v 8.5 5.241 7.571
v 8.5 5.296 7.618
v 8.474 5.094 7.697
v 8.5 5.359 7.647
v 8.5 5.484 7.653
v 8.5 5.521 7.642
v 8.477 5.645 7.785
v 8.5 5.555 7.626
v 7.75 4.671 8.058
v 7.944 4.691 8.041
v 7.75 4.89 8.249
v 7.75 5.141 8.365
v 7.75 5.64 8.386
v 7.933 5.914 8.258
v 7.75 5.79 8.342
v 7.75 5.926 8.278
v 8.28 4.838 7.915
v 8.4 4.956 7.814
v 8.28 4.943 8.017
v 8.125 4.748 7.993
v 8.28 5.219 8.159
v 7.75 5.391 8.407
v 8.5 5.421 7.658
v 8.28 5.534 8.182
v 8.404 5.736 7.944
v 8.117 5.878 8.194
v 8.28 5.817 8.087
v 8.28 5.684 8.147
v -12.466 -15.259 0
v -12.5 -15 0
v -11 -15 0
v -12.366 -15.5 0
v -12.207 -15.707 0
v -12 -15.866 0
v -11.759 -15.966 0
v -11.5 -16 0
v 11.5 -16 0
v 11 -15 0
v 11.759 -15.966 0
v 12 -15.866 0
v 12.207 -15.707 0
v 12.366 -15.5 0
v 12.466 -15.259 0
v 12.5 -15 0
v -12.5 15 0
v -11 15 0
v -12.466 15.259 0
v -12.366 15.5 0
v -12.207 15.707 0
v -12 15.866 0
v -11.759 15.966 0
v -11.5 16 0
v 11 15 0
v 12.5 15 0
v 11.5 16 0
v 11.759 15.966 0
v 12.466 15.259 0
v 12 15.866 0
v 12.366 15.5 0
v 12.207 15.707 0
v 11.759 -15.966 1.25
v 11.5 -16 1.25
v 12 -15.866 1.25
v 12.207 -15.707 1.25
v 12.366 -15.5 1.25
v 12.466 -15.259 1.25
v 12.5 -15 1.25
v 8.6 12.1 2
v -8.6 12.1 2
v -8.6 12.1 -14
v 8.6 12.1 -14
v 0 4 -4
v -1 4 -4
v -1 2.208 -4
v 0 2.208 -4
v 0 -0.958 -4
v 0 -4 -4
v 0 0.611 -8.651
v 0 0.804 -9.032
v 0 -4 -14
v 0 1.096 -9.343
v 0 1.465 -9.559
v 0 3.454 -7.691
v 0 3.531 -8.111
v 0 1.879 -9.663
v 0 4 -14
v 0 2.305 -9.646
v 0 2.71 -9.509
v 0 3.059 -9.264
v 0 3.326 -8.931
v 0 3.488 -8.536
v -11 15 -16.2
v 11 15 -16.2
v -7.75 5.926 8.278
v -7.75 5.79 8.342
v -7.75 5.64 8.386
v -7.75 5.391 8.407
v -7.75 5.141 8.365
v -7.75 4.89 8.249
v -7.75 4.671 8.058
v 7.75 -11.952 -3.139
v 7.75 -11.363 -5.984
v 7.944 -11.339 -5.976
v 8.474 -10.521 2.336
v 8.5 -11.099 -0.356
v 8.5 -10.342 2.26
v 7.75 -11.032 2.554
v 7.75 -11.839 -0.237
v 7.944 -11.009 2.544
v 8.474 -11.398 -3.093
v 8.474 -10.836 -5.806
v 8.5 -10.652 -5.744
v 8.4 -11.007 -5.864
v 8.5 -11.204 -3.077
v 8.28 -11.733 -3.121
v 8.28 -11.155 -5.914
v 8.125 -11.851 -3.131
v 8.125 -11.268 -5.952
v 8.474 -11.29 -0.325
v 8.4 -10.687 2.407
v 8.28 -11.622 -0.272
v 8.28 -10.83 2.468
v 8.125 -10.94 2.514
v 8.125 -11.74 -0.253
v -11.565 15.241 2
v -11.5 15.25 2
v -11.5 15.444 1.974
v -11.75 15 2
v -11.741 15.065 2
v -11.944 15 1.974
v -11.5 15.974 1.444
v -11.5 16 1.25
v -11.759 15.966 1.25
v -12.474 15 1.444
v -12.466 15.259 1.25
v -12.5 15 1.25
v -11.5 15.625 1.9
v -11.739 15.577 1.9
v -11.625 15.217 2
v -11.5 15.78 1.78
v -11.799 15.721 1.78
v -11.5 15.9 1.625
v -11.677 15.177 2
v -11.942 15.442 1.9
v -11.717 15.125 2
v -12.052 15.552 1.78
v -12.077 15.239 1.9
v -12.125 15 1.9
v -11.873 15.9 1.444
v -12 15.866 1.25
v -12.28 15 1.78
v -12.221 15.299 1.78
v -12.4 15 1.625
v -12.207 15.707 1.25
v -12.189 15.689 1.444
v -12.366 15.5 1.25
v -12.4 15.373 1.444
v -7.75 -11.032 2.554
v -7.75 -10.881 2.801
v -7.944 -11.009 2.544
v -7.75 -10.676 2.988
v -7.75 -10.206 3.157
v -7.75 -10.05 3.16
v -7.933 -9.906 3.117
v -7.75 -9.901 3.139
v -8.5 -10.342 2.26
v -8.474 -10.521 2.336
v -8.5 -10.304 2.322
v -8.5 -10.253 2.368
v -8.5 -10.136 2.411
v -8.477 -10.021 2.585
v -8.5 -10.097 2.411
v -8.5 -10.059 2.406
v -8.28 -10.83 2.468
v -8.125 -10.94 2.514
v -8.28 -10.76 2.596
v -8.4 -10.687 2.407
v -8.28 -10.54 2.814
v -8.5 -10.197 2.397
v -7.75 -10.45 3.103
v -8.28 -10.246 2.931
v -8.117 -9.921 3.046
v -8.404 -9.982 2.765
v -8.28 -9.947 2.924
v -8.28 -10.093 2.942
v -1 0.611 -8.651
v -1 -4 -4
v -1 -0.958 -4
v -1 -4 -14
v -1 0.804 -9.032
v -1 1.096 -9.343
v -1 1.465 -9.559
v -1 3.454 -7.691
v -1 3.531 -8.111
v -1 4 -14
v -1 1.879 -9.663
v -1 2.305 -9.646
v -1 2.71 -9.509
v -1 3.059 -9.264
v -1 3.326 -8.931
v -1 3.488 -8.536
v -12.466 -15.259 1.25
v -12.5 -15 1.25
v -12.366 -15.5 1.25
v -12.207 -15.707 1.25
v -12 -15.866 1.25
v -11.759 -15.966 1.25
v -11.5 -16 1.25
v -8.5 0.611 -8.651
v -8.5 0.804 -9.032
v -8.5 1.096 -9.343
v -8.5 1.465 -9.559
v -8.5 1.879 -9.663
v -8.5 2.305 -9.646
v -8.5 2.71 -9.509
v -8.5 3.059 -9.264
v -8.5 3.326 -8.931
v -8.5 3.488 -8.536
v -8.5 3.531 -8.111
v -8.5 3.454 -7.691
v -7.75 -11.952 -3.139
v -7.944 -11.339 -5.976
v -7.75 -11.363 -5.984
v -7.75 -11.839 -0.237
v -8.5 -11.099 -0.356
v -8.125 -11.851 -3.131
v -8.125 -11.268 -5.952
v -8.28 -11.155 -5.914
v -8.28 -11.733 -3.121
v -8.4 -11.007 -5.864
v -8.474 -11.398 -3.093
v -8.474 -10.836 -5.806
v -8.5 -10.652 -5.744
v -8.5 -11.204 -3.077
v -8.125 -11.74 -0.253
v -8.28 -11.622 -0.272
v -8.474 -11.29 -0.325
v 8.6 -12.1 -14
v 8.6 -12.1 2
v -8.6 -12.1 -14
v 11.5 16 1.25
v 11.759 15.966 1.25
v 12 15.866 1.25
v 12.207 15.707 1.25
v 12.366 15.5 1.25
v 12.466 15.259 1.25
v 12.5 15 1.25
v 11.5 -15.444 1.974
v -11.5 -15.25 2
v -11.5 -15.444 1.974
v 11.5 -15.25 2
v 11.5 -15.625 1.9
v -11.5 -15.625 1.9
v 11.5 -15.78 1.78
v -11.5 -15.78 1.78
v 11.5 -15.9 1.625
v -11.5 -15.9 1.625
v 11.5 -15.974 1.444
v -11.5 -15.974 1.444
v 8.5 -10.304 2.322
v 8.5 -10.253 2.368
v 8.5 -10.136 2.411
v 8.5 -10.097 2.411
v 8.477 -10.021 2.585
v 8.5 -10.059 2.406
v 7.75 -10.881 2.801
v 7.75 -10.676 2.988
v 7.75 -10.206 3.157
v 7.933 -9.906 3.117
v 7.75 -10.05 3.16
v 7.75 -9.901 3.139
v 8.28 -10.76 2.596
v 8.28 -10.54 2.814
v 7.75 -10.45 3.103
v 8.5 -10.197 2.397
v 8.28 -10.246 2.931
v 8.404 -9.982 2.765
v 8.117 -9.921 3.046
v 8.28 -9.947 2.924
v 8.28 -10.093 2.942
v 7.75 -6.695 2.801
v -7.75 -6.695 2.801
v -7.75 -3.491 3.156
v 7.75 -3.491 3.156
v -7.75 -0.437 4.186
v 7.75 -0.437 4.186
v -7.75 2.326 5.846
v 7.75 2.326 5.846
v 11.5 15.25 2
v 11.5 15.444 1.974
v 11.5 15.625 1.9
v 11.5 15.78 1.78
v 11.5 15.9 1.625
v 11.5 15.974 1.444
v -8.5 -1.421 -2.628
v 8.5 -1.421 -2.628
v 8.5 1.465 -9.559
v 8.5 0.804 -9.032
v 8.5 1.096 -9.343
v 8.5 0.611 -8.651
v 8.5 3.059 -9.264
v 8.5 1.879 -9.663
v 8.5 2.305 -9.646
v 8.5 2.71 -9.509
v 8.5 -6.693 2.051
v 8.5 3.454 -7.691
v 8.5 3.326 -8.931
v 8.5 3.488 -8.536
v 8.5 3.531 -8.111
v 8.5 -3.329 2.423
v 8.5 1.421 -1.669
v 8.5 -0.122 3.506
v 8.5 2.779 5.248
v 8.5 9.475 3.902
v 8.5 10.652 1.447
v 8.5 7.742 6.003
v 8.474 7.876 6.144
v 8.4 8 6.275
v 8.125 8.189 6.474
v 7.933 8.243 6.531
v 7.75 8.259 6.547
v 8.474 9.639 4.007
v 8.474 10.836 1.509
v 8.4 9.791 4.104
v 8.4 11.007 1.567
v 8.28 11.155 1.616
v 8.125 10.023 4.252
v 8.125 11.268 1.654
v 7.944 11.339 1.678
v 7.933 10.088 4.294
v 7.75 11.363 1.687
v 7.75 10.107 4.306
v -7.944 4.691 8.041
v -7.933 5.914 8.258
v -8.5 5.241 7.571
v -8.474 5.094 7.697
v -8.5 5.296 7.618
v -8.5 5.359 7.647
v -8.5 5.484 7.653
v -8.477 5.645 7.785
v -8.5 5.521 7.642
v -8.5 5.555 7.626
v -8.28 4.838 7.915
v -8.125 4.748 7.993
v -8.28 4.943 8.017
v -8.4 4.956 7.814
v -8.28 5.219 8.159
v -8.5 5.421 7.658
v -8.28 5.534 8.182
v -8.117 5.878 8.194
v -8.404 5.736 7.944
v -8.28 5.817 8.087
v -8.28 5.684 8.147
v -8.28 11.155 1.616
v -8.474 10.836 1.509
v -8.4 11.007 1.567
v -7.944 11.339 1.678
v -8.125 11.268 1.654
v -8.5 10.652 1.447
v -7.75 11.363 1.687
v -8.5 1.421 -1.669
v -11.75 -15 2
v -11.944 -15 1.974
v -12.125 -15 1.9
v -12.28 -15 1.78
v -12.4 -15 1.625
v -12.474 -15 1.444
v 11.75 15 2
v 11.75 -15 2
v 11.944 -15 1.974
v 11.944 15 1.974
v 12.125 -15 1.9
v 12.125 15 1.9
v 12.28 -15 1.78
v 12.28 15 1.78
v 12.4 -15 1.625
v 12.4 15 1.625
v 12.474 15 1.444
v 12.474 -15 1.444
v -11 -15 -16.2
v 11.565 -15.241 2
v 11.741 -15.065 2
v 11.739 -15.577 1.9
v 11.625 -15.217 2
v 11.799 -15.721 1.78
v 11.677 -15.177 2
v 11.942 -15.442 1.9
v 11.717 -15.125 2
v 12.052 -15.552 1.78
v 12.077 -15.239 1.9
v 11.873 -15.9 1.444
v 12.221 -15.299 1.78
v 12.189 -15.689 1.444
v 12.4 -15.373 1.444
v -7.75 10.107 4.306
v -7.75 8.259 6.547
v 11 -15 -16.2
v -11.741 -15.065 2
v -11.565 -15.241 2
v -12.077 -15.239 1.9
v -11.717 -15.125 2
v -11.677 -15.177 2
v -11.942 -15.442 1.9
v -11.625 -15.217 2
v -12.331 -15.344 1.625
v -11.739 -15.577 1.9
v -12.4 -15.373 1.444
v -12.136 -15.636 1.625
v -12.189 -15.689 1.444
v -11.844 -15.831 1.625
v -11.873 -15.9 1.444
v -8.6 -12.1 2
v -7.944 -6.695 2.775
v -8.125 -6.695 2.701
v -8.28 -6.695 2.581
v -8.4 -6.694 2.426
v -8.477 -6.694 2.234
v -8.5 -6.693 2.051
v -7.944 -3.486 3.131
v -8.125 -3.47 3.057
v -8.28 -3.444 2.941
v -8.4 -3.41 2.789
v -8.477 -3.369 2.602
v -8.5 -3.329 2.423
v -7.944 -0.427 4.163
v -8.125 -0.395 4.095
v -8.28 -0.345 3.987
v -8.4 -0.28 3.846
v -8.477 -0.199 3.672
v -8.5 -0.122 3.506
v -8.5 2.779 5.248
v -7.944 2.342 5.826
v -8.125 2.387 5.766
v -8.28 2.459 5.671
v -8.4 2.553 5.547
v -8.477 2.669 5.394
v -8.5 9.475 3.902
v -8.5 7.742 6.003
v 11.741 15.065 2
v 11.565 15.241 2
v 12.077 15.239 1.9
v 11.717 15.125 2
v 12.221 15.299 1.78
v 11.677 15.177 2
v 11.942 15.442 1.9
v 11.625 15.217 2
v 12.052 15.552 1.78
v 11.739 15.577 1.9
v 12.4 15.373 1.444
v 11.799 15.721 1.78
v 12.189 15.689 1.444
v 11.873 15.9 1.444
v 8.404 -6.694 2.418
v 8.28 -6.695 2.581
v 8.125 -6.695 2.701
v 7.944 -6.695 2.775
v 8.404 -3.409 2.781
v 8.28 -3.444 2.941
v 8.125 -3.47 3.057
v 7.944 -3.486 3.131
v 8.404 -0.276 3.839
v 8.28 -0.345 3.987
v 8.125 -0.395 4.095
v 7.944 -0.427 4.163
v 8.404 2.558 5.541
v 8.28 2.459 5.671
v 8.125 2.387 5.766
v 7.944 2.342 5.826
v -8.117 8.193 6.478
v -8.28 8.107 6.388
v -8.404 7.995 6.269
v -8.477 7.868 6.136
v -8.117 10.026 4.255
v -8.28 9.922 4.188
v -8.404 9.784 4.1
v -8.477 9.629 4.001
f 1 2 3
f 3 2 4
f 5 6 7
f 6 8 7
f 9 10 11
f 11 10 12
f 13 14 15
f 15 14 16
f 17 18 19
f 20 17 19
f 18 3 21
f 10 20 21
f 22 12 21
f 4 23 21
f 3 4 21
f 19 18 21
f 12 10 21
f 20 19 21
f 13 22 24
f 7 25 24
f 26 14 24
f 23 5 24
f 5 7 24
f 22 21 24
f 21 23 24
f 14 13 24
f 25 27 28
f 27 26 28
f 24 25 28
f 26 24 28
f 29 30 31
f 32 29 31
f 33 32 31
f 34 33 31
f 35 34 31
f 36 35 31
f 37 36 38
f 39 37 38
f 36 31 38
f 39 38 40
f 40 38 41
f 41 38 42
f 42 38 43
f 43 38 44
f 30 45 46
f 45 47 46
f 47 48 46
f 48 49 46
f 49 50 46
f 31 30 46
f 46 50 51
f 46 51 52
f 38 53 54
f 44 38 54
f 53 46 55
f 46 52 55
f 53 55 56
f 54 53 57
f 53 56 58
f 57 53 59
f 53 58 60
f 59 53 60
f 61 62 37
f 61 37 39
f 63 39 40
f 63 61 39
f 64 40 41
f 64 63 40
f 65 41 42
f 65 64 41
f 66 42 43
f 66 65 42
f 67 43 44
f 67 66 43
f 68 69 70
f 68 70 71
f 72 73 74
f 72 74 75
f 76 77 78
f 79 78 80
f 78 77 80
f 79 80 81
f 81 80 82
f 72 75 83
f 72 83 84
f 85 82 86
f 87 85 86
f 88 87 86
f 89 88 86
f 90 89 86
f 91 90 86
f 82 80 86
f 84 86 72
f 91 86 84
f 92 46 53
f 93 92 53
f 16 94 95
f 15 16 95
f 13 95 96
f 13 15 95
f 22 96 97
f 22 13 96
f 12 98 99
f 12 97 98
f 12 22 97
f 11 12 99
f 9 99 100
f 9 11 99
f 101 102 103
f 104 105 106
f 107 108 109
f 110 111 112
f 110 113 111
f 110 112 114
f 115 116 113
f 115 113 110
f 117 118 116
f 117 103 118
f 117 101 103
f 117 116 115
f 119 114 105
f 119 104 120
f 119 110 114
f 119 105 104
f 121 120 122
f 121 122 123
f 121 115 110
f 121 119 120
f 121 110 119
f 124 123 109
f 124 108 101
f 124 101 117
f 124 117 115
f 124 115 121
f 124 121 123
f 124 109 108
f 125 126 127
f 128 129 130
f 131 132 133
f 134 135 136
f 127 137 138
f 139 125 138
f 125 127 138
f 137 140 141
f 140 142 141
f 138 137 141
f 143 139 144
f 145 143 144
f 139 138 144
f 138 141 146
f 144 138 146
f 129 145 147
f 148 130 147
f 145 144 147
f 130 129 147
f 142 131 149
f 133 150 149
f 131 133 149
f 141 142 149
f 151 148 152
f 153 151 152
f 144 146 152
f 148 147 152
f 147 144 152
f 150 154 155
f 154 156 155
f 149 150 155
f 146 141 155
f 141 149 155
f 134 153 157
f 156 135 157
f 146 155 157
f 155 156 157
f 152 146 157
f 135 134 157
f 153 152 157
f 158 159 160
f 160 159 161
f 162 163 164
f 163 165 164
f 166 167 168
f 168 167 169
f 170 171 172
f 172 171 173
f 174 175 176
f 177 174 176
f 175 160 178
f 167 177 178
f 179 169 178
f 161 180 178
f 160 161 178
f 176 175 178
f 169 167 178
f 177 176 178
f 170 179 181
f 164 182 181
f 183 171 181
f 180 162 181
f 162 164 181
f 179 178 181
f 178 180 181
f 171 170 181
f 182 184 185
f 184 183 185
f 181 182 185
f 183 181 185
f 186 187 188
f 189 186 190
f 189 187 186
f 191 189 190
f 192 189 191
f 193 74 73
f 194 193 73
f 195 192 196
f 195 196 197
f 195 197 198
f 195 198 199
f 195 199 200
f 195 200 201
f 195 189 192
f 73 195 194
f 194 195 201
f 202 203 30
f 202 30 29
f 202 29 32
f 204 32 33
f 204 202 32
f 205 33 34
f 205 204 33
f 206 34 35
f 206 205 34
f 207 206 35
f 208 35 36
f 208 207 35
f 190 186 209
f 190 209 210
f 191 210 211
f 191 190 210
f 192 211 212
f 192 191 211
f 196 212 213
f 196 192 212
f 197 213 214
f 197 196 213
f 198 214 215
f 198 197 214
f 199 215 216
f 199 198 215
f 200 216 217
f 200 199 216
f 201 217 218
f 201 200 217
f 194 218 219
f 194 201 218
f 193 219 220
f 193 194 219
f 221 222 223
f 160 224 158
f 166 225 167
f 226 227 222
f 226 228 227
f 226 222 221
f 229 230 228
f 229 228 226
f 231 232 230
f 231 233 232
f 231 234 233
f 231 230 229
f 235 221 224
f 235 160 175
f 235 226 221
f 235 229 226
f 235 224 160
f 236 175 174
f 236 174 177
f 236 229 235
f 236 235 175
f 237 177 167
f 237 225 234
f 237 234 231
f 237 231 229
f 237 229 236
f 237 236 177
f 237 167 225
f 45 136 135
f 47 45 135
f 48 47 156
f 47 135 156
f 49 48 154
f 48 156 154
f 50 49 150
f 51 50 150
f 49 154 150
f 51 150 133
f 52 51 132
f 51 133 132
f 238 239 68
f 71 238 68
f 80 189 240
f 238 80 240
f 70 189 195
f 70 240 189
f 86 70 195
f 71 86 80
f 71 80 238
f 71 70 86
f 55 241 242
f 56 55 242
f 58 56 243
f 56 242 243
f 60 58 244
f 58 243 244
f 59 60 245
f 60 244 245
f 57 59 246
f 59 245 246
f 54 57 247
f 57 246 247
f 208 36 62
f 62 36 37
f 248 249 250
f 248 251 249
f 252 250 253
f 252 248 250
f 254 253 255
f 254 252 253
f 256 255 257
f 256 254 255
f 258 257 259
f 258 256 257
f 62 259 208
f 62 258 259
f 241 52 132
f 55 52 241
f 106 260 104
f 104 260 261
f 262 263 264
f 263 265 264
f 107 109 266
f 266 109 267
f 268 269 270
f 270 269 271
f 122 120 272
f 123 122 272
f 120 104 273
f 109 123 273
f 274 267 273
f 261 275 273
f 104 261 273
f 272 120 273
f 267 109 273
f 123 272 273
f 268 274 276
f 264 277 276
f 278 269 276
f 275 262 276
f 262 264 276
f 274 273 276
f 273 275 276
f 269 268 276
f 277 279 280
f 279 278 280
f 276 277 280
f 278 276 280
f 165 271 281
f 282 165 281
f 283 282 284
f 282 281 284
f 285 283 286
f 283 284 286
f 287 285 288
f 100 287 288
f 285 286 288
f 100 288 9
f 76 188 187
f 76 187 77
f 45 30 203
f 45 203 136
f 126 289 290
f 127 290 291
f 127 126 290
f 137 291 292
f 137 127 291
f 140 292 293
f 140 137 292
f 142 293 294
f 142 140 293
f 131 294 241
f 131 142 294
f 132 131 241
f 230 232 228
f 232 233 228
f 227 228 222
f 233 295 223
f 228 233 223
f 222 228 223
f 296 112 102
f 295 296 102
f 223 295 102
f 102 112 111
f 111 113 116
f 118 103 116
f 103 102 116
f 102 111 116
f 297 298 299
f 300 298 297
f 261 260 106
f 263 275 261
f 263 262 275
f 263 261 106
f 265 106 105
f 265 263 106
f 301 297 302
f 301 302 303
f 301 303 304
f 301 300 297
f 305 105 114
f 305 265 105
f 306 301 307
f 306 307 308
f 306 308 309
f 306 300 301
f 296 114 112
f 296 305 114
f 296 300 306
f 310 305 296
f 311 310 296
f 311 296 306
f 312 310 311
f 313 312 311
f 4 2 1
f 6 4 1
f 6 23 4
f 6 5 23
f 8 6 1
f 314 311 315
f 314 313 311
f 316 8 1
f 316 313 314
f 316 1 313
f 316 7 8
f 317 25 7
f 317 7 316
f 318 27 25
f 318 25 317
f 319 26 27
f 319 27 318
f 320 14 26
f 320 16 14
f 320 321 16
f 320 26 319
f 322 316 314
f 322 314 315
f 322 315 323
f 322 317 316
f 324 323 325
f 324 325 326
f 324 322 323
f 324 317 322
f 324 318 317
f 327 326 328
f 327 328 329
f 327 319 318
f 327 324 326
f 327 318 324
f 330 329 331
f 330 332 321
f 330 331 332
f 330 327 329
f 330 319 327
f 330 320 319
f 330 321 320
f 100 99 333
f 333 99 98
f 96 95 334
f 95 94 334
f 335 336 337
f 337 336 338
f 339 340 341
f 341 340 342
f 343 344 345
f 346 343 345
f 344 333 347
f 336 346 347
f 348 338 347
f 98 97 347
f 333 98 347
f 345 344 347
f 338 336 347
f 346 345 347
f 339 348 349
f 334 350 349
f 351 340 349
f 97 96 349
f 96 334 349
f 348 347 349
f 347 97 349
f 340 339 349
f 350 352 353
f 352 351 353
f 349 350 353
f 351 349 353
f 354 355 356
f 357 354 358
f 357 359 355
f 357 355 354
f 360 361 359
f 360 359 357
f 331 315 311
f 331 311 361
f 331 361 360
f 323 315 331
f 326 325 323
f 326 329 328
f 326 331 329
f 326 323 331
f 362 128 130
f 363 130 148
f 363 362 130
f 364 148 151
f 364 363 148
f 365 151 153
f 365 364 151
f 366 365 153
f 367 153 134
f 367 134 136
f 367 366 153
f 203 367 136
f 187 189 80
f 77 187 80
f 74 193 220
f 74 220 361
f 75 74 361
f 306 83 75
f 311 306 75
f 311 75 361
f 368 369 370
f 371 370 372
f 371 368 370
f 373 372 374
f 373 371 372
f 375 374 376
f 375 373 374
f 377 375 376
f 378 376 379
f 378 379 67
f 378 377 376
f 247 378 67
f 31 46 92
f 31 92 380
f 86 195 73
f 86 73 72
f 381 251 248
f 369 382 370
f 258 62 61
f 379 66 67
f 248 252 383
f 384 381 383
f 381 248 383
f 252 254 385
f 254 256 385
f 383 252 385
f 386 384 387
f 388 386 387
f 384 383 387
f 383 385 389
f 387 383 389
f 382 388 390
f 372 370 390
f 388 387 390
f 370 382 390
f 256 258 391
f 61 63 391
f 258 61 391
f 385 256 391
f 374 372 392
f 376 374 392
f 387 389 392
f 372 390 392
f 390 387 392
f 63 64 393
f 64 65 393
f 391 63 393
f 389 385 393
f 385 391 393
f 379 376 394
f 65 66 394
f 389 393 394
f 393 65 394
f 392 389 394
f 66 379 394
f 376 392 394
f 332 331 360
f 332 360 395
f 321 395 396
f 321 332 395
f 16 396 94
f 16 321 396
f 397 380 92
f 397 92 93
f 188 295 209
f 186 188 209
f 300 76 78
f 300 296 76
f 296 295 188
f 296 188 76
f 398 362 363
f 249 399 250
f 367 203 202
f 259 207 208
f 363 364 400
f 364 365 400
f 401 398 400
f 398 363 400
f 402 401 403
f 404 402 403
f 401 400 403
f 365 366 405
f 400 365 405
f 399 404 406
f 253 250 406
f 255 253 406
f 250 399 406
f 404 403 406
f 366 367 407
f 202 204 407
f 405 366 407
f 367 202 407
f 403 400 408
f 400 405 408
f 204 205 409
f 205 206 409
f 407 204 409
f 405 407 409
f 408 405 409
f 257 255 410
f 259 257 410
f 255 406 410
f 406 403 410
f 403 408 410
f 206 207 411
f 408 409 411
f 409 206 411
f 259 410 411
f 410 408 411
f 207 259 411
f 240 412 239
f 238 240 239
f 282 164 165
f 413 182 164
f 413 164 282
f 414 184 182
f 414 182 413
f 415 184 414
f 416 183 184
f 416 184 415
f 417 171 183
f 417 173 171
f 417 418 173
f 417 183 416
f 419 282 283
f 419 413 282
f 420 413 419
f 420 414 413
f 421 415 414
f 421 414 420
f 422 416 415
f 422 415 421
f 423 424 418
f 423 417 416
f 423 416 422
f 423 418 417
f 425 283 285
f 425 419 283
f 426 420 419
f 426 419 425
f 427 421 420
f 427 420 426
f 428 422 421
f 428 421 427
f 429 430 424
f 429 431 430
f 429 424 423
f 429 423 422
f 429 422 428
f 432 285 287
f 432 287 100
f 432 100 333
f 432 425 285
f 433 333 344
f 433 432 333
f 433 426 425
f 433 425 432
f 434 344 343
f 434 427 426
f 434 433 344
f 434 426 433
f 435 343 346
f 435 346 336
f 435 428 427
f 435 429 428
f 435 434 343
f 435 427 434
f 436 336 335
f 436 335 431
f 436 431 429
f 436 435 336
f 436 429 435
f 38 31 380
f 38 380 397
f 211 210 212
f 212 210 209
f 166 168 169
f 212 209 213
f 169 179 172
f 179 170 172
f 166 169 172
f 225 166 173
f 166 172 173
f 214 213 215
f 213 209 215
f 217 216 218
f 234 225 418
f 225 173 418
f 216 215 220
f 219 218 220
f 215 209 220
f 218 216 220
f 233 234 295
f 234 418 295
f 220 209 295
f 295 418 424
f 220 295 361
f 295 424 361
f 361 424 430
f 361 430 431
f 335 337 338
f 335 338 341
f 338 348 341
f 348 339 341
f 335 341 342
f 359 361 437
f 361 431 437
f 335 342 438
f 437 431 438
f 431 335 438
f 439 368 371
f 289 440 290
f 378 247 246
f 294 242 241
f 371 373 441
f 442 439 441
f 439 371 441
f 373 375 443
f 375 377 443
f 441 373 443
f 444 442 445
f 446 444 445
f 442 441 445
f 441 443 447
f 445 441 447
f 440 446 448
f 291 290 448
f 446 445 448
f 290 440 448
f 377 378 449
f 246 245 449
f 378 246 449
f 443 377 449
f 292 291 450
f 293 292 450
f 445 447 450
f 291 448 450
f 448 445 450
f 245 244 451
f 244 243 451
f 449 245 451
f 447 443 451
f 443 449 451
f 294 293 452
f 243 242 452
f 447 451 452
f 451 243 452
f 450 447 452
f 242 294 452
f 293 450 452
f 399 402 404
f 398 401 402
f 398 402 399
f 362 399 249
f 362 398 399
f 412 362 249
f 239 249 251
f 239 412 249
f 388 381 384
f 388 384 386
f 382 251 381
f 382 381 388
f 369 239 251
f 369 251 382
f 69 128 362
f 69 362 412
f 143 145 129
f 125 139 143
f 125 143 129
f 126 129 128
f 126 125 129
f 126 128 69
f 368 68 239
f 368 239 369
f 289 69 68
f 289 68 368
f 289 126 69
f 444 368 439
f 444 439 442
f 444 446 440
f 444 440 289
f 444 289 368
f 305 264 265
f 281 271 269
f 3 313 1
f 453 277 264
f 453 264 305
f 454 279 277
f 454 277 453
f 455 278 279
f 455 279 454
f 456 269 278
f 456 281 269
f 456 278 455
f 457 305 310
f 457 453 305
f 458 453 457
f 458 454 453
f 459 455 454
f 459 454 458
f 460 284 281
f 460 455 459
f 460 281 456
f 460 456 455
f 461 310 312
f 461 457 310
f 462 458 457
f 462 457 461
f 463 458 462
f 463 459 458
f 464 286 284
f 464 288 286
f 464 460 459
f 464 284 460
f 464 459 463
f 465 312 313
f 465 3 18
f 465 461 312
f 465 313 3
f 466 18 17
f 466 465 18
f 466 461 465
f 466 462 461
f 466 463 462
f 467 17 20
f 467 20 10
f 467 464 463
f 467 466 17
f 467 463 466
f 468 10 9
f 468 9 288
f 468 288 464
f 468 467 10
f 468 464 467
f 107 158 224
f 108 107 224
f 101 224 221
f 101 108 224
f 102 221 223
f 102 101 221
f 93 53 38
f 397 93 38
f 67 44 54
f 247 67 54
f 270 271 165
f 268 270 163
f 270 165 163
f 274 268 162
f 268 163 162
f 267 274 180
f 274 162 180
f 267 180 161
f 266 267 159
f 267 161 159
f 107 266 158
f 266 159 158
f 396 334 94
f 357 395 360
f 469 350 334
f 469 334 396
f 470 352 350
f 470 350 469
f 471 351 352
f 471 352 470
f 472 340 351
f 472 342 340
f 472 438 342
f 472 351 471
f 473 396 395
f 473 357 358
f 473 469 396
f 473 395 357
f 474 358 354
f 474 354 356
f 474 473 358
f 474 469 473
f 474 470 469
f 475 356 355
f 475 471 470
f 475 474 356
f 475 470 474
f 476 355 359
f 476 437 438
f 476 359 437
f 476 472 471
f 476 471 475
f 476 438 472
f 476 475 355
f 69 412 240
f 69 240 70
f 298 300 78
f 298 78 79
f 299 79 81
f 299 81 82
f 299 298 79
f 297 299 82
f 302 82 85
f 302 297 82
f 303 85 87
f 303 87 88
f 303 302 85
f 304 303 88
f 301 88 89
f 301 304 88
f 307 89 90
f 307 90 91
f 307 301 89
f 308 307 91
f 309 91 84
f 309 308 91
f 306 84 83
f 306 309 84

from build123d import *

# Parameters (mm, degrees)
SKETCH_W     = 25
SKETCH_H     = 32
PAD_DEPTH    = 2
SKETCH001_W  = 22
SKETCH001_H  = 30
PAD001_DEPTH = 16.200001
SKETCH002_W  = 17.2
SKETCH002_H  = 24.2
POCKET_DEPTH = 16
SKETCH003_W  = 1
SKETCH003_H  = 8
PAD002_DEPTH = 10
PAD003_DEPTH = 8.5
FILLET_R     = 1
FILLET001_R  = 0.75
FILLET002_R  = 1
FILLET003_R  = 0.75


with BuildPart() as part:
    # Sketch → Pad (new body)
    with BuildSketch(Plane.XY):
        Rectangle(SKETCH_W, SKETCH_H)
    extrude(amount=PAD_DEPTH)

    # Sketch001 → Pad001 (new body)
    with BuildSketch(Plane(origin=(0, 0, 0), x_dir=(1, 0, 0), z_dir=(0, 0, -1))):
        Rectangle(SKETCH001_W, SKETCH001_H)
    extrude(amount=PAD001_DEPTH)

    # Sketch002 → Pocket (cut)
    with BuildSketch(Plane.XY.offset(2)):
        Rectangle(SKETCH002_W, SKETCH002_H)
    extrude(amount=-POCKET_DEPTH, mode=Mode.SUBTRACT)

    # Sketch003 → Pad002 (new body)
    with BuildSketch(Plane.XY.offset(-14)):
        with Locations((-0.5, 0)):
            Rectangle(SKETCH003_W, SKETCH003_H)
    extrude(amount=PAD002_DEPTH)

    # Sketch004 → Pad003 (new body, symmetric)
    with BuildSketch(Plane.YZ):
        with BuildLine():
            Line((-1.421224, -2.628412), (0.611463, -8.650596))
            ThreePointArc((0.611463, -8.650596), (2.512397, -9.59211), (3.453911, -7.691175))
            Line((3.453911, -7.691175), (1.421224, -1.668991))
            Line((1.421224, -1.668991), (11.362733, 1.686598))
            ThreePointArc((11.362733, 1.686598), (8.973628, 5.807128), (5.169008, 8.672693))
            ThreePointArc((-10.669687, 3.326607), (-1.936582, 3.588753), (5.169008, 8.672693))
            ThreePointArc((-10.669687, 3.326607), (-11.959462, -1.258485), (-11.362733, -5.984001))
            Line((-1.421224, -2.628412), (-11.362733, -5.984001))
        make_face()
    extrude(amount=PAD003_DEPTH, both=True)

    # Fillet
    fillet_edges = [part.edges().sort_by_distance(p)[0] for p in [
        (-12.5, -16, 1),
        (12.5, -16, 1),
        (12.5, 16, 1),
        (-12.5, 16, 1),
    ]]
    fillet(fillet_edges, radius=FILLET_R)

    # Fillet001
    fillet001_edges = [part.edges().sort_by_distance(p)[0] for p in [
        (0, -16, 2),
    ]]
    fillet(fillet001_edges, radius=FILLET001_R)

    # Fillet002
    fillet002_edges = [part.edges().sort_by_distance(p)[0] for p in [
        (0, -10.669687, 3.326607),
        (0, 5.169008, 8.672693),
    ]]
    fillet(fillet002_edges, radius=FILLET002_R)

    # Fillet003
    fillet003_edges = [part.edges().sort_by_distance(p)[0] for p in [
        (8.5, -1.936582, 3.588753),
        (-8.5, -1.936582, 3.588753),
    ]]
    fillet(fillet003_edges, radius=FILLET003_R)


solid = part.part
